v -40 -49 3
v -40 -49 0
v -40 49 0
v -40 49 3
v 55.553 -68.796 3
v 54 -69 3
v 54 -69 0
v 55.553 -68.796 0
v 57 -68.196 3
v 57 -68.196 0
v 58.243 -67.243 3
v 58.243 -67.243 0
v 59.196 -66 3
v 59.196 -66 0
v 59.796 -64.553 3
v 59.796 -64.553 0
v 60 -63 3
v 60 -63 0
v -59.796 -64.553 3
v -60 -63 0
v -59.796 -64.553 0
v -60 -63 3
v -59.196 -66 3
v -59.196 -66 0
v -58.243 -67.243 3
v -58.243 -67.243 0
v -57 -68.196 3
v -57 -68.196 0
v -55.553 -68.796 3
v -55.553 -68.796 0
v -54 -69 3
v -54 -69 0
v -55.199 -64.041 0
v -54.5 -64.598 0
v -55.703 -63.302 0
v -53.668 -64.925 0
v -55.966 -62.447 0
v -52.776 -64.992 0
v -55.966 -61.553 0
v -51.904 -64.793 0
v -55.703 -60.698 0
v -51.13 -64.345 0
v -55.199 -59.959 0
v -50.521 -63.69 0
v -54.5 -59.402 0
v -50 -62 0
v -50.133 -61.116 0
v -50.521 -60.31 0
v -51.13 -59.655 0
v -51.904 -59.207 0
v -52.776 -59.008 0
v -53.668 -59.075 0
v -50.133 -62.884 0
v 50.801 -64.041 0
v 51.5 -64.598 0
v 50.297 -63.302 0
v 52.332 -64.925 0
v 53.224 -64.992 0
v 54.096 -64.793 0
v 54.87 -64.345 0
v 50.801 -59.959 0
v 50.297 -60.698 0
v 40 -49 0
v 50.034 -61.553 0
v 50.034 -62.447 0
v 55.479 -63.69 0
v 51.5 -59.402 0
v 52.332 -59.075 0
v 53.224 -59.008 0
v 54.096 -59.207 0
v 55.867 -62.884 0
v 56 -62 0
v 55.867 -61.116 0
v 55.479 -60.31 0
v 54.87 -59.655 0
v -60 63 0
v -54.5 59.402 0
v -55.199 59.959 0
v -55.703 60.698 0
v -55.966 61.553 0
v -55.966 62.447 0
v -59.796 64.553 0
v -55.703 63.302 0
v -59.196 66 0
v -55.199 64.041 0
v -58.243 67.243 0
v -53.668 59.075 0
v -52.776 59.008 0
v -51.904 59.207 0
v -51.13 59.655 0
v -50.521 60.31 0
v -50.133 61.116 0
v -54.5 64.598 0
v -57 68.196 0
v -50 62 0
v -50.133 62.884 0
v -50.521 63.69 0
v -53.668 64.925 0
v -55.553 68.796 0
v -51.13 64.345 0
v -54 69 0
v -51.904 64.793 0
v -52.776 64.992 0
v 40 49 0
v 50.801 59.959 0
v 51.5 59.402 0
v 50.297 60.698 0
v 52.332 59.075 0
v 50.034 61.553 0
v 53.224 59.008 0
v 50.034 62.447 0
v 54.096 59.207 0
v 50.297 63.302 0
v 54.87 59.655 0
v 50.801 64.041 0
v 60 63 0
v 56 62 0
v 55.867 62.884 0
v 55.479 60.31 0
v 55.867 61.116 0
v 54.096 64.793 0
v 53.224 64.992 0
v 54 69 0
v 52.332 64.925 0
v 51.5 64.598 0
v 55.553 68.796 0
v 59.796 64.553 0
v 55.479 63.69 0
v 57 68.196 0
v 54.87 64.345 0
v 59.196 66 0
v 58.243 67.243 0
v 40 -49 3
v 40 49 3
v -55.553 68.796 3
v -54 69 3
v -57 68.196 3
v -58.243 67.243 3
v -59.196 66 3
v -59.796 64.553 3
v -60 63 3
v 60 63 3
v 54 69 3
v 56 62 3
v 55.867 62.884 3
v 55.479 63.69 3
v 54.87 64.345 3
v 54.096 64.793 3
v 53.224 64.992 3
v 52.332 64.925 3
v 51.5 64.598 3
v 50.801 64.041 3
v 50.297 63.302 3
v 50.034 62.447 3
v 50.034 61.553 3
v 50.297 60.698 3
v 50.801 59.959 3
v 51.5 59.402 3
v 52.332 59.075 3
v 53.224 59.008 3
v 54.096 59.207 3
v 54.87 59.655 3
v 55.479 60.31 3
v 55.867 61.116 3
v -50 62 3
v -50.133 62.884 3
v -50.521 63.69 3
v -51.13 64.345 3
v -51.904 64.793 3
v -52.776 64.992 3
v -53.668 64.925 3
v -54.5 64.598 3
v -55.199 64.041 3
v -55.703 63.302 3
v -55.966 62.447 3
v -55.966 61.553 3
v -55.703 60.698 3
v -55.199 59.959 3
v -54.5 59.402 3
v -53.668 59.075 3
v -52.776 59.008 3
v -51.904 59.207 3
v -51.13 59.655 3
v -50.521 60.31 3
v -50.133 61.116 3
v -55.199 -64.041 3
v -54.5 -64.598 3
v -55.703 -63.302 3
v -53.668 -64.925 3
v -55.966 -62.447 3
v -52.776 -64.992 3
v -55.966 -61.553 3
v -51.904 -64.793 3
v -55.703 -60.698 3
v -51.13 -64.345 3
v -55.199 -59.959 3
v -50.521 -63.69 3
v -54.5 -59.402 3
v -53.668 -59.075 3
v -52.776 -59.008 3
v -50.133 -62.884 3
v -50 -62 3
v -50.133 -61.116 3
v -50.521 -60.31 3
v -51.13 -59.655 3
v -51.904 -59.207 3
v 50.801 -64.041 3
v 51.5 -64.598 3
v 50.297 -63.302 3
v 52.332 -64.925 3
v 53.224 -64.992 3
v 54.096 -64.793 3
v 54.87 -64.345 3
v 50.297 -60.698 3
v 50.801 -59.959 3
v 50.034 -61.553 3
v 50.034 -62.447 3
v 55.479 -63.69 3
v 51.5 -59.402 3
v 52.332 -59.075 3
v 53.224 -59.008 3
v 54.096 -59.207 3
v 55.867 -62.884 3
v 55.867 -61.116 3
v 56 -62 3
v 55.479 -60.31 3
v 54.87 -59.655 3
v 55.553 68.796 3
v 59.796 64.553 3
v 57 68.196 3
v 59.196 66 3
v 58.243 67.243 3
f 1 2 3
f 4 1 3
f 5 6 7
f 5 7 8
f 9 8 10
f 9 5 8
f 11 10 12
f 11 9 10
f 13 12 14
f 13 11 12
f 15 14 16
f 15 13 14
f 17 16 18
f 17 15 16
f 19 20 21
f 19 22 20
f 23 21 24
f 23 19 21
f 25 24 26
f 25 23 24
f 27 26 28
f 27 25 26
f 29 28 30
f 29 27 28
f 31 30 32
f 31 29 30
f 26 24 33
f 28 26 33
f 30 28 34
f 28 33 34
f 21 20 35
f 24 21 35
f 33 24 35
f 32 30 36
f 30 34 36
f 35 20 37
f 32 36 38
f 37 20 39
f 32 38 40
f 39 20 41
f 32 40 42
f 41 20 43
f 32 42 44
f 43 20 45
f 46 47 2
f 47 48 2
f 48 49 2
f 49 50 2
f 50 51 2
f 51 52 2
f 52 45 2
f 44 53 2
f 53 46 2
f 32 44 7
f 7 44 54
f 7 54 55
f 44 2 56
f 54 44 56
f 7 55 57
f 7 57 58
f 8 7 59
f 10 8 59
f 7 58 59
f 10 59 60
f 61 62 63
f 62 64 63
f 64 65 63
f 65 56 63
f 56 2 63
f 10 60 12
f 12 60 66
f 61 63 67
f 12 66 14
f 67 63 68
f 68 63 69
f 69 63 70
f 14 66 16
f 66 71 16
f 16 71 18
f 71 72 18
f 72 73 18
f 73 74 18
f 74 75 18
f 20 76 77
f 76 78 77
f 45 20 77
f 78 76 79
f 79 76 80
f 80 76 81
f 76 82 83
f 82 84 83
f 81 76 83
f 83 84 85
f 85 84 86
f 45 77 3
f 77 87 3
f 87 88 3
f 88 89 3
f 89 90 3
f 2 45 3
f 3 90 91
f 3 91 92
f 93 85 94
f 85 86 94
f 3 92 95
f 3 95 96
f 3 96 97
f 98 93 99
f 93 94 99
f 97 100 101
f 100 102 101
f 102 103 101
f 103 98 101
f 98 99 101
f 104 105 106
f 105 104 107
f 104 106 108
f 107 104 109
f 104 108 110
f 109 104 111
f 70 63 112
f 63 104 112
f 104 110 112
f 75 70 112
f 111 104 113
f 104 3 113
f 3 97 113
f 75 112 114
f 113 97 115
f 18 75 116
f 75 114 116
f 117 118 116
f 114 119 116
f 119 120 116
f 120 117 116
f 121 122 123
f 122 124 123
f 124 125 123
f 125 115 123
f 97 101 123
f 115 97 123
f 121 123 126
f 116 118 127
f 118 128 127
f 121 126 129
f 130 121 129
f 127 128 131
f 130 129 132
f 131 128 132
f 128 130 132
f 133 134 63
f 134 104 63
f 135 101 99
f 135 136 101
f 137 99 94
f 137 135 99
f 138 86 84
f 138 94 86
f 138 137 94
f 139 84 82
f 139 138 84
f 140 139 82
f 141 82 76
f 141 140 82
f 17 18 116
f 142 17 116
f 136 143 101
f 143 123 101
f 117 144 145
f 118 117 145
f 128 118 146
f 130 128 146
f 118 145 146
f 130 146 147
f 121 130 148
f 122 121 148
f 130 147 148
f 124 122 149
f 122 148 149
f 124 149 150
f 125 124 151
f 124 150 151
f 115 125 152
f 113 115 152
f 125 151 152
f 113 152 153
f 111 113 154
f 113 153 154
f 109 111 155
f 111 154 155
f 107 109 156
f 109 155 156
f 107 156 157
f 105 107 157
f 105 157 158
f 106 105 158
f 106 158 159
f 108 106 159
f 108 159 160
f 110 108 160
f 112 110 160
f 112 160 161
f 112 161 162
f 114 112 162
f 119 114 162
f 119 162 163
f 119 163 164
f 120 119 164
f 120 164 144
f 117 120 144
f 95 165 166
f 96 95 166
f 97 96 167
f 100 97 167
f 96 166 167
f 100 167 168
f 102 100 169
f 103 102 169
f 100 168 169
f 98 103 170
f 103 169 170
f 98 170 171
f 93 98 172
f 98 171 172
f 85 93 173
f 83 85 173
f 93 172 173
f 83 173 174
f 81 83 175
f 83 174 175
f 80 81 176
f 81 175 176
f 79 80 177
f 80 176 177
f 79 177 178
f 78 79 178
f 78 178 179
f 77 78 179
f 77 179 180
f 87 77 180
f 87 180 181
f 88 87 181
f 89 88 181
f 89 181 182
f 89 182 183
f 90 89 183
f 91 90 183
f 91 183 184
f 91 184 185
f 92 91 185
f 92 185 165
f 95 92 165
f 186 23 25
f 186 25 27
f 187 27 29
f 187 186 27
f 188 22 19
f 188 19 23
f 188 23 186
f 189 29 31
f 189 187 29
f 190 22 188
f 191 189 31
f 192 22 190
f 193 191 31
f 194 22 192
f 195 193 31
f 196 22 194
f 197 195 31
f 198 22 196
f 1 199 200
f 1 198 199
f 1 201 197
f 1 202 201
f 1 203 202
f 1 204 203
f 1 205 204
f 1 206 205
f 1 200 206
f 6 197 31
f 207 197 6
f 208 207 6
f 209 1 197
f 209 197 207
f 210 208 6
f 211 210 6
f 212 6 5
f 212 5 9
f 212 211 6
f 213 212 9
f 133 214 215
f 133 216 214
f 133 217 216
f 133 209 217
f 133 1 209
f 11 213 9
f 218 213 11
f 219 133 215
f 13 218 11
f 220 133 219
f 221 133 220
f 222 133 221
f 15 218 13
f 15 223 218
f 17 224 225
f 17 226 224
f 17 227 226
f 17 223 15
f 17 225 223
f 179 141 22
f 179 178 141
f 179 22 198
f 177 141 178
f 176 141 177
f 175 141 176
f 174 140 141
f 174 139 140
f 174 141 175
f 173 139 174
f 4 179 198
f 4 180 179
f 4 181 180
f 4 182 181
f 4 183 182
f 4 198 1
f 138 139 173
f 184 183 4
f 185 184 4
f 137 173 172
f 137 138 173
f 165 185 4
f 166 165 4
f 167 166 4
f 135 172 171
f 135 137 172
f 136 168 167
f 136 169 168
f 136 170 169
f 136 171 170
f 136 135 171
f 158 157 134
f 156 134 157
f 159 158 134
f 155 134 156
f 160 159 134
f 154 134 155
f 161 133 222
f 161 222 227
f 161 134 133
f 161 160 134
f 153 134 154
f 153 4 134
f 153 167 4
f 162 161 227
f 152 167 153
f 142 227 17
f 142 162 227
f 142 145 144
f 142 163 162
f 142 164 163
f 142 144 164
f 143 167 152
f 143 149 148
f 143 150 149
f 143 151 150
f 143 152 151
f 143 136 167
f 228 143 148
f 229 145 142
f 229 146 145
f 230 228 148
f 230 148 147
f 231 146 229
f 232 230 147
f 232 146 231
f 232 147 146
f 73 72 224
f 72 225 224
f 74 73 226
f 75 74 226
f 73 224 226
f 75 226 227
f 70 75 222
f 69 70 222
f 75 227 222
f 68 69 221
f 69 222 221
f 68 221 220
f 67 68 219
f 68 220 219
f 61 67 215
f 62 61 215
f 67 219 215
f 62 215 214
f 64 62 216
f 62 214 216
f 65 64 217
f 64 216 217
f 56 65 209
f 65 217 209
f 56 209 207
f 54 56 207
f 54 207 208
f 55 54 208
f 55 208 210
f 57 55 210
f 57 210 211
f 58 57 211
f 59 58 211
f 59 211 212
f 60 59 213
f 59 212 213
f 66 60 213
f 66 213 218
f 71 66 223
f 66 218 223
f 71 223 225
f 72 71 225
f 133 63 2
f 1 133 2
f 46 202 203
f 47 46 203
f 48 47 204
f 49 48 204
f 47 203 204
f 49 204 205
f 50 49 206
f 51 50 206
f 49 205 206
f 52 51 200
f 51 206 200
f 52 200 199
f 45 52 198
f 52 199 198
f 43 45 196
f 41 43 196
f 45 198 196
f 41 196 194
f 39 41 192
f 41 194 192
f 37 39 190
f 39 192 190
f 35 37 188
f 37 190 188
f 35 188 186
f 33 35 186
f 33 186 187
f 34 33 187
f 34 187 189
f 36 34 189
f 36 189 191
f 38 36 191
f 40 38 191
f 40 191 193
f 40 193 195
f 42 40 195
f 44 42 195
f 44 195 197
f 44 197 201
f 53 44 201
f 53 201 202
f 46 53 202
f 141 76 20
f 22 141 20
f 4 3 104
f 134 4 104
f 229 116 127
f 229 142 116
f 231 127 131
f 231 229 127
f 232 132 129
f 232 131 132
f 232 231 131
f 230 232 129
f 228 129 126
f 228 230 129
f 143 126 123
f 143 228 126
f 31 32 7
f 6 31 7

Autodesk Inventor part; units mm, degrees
ref_plane "YZ Plane" through (0, 0, 0) normal (1, 0, 0) x (0, 1, 0)
ref_plane "XZ Plane" through (0, 0, 0) normal (0, 1, 0) x (-1, 0, 0)
ref_plane "XY Plane" through (0, 0, 0) normal (0, 0, 1) x (1, 0, 0)
sketch "Sketch1" plane through (0, 0, 0) normal (0, 0, 1) x (1, 0, 0)
  line L0 (-60, -69) -> (60, -69)
  line L1 (60, -69) -> (60, 69)
  line L2 (60, 69) -> (-60, 69)
  line L3 (-60, 69) -> (-60, -69)
  line L4 (-60, -69) -> (60, 69) construction
  line L5 (60, -69) -> (-60, 69) construction
  line L6 (40, -49) -> (-40, -49)
  line L7 (-40, -49) -> (-40, 49)
  line L8 (-40, 49) -> (40, 49)
  line L9 (40, 49) -> (40, -49)
  line L10 (40, -49) -> (-40, 49) construction
  line L11 (-40, -49) -> (40, 49) construction
  point P0 (0, 0)
  dimension "d172" = 80
  dimension "d180" = 20
  dimension "d181" = 20
  dimension "d182" = 98
extrude "Plate5" add sketch "Sketch1" along normal blind 3
sketch "Sketch9" plane through (0, 0, 3) normal (0, 0, 1) x (1, 0, 0)
  circle A0 centre (53, -62) radius 3
  line L0 (53, 62) -> (-53, 62) construction
  line L1 (-53, 62) -> (-53, -62) construction
  line L2 (-53, -62) -> (53, -62) construction
  line L3 (53, -62) -> (53, 62) construction
  line L4 (53, 62) -> (-53, -62) construction
  line L5 (-53, 62) -> (53, -62) construction
  circle A1 centre (-53, -62) radius 3
  circle A2 centre (53, 62) radius 3
  circle A3 centre (-53, 62) radius 3
  line L6 (-40, -49) -> (-40, 49) projected
  line L7 (-40, 49) -> (40, 49) projected
  line L8 (40, 49) -> (40, -49) projected
  line L9 (40, -49) -> (-40, -49) projected
  line L10 (60, -69) -> (-60, -69) projected
  line L11 (60, 69) -> (60, -69) projected
  line L12 (-60, 69) -> (60, 69) projected
  line L13 (-60, -69) -> (-60, 69) projected
  circle A4 centre (-53, 0) radius 3 construction
  circle A5 centre (53, 0) radius 3 construction
  point P0 (0, 0)
  dimension "d174" = 6
  dimension "d183" = 7
  dimension "d184" = 7
extrude "Cut2" cut sketch "Sketch9" against normal blind 3 contours A0 | A1 | A2 | A3
fillet "Corner Round1" radius 6 4 edges at (60, 69, 1.5) (-60, 69, 1.5) (-60, -69, 1.5) (60, -69, 1.5)
properties part number "ANP 1421 FDS Diam way flange 1" material "Stainless Steel"
